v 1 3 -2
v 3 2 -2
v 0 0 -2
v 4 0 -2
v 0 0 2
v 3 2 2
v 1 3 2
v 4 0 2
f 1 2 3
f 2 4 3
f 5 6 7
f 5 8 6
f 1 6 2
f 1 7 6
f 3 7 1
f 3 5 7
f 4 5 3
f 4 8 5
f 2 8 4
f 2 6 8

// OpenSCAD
height = 4;
points = [
    [0, 0],
    [4, 0],
    [3, 2],
    [1, 3]
];

linear_extrude(height = height, center = true)
    polygon(points = points);
